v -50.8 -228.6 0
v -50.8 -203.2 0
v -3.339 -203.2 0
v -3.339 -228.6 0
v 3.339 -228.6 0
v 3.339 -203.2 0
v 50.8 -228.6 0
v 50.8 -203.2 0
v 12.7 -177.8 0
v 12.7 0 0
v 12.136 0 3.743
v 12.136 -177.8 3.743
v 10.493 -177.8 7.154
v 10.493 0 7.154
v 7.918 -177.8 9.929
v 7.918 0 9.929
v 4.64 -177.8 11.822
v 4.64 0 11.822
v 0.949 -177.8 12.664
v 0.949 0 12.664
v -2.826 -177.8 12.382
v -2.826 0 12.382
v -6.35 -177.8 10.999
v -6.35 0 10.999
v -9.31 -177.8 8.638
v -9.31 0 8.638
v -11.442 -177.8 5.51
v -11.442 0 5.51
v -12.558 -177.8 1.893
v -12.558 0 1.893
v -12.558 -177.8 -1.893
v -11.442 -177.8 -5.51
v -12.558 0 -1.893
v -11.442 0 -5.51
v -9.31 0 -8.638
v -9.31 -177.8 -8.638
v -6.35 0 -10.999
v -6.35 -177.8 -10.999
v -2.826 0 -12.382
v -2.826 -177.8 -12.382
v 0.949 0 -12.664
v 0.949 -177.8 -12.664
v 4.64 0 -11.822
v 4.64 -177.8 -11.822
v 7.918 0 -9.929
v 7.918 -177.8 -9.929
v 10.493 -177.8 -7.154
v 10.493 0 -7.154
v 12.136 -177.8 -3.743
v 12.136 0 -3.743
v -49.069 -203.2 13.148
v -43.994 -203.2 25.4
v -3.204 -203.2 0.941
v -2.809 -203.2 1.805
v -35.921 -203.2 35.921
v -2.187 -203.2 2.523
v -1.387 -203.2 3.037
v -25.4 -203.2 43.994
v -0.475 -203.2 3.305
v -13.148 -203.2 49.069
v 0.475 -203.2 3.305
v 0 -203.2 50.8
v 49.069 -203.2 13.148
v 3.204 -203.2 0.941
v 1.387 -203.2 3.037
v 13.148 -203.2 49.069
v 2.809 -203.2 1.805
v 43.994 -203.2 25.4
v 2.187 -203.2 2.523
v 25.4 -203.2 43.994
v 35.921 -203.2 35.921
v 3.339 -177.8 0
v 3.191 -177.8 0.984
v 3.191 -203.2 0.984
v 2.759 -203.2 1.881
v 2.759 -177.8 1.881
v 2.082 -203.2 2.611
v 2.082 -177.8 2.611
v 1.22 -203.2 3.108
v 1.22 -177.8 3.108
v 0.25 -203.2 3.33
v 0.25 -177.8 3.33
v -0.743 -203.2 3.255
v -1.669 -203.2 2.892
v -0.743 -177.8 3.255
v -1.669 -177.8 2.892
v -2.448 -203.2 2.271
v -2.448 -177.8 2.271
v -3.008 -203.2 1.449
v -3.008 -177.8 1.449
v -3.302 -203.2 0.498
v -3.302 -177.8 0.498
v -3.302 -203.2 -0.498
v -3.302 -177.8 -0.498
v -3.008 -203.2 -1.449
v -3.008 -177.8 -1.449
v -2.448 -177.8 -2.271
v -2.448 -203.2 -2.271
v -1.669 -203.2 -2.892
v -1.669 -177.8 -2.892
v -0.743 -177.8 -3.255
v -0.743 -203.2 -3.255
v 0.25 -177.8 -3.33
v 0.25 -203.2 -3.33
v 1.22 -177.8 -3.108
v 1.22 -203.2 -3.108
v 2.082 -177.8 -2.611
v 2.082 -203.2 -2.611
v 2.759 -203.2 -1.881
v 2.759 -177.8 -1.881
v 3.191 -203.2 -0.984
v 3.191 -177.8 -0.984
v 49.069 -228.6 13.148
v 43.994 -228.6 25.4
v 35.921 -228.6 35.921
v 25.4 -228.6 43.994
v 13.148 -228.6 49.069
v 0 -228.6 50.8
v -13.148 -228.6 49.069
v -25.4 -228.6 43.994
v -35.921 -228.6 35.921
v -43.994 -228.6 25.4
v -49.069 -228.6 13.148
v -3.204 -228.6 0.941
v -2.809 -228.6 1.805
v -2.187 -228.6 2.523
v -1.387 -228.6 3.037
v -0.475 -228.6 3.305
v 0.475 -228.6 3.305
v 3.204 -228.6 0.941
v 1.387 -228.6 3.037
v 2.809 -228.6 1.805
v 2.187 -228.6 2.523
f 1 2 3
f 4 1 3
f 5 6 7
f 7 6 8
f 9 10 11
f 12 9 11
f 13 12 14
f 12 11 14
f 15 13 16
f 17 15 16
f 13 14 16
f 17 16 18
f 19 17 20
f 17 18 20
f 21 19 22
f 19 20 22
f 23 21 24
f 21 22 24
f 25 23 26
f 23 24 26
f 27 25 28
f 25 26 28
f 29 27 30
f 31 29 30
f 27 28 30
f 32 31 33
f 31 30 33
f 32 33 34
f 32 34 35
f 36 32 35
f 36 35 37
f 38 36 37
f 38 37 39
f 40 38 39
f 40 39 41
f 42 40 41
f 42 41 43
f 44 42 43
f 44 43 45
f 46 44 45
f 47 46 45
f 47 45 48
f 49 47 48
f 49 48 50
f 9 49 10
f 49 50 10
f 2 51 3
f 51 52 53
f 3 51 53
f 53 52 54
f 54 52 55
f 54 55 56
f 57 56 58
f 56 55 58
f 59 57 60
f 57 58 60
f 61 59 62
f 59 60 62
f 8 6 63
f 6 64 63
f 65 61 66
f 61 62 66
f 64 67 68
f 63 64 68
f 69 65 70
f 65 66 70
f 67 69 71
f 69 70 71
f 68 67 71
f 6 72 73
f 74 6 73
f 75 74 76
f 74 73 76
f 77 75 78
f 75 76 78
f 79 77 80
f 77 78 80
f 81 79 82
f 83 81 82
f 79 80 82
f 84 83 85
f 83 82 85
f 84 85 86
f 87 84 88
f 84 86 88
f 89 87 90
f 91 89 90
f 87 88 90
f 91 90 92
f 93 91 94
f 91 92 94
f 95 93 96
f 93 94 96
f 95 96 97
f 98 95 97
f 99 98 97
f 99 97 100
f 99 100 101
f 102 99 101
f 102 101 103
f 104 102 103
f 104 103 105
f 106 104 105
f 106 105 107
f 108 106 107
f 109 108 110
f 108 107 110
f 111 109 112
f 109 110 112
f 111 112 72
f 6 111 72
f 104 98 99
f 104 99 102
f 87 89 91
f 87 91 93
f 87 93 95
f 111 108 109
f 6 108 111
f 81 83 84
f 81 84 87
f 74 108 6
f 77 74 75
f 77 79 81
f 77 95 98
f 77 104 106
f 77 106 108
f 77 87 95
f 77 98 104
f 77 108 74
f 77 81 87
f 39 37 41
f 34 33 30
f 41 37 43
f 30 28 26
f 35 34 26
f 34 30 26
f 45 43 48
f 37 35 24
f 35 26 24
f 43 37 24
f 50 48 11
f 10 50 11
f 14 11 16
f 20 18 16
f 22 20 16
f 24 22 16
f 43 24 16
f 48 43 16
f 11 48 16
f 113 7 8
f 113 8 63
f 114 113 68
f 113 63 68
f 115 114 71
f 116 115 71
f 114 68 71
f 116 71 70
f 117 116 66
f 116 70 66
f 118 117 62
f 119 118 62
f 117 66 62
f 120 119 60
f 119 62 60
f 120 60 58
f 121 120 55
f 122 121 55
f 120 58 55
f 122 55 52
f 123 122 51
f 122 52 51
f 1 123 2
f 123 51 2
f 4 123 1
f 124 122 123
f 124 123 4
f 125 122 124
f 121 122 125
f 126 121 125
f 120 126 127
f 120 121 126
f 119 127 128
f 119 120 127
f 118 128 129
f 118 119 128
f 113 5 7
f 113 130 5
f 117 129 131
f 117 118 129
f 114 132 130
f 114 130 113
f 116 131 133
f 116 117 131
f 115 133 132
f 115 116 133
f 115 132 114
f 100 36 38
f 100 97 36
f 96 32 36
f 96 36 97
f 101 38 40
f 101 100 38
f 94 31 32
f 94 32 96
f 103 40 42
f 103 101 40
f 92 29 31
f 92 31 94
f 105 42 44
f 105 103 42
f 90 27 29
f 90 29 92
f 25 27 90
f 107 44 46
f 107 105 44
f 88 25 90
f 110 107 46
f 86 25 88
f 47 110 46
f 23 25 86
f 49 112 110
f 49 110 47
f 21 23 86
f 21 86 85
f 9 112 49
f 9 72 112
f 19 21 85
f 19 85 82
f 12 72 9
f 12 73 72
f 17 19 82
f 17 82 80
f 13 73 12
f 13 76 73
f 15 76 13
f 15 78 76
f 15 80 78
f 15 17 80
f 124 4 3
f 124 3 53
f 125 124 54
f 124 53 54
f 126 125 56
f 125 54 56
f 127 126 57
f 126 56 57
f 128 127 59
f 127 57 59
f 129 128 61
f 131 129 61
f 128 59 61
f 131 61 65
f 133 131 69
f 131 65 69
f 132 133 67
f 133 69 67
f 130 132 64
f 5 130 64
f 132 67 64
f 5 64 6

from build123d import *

# Parameters (mm, degrees)
F0_R     = 12.7
F1_DEPTH = 177.8
F2_R     = 3.338964
F3_DEPTH = 25.4
F5_DEPTH = 25.4


with BuildPart() as f1:
    # F0 (on Front) → F1 (new body)
    with BuildSketch(Plane.XZ):
        Circle(F0_R)
    extrude(amount=F1_DEPTH)

    # F2 (on face) → F3 (join)
    with BuildSketch(Plane.XZ.offset(177.8)):
        Circle(F2_R)
    extrude(amount=F3_DEPTH)


with BuildPart() as f5:
    # F4 (on face) → F5 (new body)
    with BuildSketch(Plane.XZ.offset(203.2)):
        with BuildLine():
            Line((3.338964, 0), (50.8, 0))
            ThreePointArc((50.8, 0), (0, 50.8), (-50.8, 0))
            Line((-50.8, 0), (-3.338964, 0))
            ThreePointArc((-3.338964, 0), (0, 3.338964), (3.338964, 0))
        make_face()
    extrude(amount=F5_DEPTH)


solid = Compound([f1.part, f5.part])
